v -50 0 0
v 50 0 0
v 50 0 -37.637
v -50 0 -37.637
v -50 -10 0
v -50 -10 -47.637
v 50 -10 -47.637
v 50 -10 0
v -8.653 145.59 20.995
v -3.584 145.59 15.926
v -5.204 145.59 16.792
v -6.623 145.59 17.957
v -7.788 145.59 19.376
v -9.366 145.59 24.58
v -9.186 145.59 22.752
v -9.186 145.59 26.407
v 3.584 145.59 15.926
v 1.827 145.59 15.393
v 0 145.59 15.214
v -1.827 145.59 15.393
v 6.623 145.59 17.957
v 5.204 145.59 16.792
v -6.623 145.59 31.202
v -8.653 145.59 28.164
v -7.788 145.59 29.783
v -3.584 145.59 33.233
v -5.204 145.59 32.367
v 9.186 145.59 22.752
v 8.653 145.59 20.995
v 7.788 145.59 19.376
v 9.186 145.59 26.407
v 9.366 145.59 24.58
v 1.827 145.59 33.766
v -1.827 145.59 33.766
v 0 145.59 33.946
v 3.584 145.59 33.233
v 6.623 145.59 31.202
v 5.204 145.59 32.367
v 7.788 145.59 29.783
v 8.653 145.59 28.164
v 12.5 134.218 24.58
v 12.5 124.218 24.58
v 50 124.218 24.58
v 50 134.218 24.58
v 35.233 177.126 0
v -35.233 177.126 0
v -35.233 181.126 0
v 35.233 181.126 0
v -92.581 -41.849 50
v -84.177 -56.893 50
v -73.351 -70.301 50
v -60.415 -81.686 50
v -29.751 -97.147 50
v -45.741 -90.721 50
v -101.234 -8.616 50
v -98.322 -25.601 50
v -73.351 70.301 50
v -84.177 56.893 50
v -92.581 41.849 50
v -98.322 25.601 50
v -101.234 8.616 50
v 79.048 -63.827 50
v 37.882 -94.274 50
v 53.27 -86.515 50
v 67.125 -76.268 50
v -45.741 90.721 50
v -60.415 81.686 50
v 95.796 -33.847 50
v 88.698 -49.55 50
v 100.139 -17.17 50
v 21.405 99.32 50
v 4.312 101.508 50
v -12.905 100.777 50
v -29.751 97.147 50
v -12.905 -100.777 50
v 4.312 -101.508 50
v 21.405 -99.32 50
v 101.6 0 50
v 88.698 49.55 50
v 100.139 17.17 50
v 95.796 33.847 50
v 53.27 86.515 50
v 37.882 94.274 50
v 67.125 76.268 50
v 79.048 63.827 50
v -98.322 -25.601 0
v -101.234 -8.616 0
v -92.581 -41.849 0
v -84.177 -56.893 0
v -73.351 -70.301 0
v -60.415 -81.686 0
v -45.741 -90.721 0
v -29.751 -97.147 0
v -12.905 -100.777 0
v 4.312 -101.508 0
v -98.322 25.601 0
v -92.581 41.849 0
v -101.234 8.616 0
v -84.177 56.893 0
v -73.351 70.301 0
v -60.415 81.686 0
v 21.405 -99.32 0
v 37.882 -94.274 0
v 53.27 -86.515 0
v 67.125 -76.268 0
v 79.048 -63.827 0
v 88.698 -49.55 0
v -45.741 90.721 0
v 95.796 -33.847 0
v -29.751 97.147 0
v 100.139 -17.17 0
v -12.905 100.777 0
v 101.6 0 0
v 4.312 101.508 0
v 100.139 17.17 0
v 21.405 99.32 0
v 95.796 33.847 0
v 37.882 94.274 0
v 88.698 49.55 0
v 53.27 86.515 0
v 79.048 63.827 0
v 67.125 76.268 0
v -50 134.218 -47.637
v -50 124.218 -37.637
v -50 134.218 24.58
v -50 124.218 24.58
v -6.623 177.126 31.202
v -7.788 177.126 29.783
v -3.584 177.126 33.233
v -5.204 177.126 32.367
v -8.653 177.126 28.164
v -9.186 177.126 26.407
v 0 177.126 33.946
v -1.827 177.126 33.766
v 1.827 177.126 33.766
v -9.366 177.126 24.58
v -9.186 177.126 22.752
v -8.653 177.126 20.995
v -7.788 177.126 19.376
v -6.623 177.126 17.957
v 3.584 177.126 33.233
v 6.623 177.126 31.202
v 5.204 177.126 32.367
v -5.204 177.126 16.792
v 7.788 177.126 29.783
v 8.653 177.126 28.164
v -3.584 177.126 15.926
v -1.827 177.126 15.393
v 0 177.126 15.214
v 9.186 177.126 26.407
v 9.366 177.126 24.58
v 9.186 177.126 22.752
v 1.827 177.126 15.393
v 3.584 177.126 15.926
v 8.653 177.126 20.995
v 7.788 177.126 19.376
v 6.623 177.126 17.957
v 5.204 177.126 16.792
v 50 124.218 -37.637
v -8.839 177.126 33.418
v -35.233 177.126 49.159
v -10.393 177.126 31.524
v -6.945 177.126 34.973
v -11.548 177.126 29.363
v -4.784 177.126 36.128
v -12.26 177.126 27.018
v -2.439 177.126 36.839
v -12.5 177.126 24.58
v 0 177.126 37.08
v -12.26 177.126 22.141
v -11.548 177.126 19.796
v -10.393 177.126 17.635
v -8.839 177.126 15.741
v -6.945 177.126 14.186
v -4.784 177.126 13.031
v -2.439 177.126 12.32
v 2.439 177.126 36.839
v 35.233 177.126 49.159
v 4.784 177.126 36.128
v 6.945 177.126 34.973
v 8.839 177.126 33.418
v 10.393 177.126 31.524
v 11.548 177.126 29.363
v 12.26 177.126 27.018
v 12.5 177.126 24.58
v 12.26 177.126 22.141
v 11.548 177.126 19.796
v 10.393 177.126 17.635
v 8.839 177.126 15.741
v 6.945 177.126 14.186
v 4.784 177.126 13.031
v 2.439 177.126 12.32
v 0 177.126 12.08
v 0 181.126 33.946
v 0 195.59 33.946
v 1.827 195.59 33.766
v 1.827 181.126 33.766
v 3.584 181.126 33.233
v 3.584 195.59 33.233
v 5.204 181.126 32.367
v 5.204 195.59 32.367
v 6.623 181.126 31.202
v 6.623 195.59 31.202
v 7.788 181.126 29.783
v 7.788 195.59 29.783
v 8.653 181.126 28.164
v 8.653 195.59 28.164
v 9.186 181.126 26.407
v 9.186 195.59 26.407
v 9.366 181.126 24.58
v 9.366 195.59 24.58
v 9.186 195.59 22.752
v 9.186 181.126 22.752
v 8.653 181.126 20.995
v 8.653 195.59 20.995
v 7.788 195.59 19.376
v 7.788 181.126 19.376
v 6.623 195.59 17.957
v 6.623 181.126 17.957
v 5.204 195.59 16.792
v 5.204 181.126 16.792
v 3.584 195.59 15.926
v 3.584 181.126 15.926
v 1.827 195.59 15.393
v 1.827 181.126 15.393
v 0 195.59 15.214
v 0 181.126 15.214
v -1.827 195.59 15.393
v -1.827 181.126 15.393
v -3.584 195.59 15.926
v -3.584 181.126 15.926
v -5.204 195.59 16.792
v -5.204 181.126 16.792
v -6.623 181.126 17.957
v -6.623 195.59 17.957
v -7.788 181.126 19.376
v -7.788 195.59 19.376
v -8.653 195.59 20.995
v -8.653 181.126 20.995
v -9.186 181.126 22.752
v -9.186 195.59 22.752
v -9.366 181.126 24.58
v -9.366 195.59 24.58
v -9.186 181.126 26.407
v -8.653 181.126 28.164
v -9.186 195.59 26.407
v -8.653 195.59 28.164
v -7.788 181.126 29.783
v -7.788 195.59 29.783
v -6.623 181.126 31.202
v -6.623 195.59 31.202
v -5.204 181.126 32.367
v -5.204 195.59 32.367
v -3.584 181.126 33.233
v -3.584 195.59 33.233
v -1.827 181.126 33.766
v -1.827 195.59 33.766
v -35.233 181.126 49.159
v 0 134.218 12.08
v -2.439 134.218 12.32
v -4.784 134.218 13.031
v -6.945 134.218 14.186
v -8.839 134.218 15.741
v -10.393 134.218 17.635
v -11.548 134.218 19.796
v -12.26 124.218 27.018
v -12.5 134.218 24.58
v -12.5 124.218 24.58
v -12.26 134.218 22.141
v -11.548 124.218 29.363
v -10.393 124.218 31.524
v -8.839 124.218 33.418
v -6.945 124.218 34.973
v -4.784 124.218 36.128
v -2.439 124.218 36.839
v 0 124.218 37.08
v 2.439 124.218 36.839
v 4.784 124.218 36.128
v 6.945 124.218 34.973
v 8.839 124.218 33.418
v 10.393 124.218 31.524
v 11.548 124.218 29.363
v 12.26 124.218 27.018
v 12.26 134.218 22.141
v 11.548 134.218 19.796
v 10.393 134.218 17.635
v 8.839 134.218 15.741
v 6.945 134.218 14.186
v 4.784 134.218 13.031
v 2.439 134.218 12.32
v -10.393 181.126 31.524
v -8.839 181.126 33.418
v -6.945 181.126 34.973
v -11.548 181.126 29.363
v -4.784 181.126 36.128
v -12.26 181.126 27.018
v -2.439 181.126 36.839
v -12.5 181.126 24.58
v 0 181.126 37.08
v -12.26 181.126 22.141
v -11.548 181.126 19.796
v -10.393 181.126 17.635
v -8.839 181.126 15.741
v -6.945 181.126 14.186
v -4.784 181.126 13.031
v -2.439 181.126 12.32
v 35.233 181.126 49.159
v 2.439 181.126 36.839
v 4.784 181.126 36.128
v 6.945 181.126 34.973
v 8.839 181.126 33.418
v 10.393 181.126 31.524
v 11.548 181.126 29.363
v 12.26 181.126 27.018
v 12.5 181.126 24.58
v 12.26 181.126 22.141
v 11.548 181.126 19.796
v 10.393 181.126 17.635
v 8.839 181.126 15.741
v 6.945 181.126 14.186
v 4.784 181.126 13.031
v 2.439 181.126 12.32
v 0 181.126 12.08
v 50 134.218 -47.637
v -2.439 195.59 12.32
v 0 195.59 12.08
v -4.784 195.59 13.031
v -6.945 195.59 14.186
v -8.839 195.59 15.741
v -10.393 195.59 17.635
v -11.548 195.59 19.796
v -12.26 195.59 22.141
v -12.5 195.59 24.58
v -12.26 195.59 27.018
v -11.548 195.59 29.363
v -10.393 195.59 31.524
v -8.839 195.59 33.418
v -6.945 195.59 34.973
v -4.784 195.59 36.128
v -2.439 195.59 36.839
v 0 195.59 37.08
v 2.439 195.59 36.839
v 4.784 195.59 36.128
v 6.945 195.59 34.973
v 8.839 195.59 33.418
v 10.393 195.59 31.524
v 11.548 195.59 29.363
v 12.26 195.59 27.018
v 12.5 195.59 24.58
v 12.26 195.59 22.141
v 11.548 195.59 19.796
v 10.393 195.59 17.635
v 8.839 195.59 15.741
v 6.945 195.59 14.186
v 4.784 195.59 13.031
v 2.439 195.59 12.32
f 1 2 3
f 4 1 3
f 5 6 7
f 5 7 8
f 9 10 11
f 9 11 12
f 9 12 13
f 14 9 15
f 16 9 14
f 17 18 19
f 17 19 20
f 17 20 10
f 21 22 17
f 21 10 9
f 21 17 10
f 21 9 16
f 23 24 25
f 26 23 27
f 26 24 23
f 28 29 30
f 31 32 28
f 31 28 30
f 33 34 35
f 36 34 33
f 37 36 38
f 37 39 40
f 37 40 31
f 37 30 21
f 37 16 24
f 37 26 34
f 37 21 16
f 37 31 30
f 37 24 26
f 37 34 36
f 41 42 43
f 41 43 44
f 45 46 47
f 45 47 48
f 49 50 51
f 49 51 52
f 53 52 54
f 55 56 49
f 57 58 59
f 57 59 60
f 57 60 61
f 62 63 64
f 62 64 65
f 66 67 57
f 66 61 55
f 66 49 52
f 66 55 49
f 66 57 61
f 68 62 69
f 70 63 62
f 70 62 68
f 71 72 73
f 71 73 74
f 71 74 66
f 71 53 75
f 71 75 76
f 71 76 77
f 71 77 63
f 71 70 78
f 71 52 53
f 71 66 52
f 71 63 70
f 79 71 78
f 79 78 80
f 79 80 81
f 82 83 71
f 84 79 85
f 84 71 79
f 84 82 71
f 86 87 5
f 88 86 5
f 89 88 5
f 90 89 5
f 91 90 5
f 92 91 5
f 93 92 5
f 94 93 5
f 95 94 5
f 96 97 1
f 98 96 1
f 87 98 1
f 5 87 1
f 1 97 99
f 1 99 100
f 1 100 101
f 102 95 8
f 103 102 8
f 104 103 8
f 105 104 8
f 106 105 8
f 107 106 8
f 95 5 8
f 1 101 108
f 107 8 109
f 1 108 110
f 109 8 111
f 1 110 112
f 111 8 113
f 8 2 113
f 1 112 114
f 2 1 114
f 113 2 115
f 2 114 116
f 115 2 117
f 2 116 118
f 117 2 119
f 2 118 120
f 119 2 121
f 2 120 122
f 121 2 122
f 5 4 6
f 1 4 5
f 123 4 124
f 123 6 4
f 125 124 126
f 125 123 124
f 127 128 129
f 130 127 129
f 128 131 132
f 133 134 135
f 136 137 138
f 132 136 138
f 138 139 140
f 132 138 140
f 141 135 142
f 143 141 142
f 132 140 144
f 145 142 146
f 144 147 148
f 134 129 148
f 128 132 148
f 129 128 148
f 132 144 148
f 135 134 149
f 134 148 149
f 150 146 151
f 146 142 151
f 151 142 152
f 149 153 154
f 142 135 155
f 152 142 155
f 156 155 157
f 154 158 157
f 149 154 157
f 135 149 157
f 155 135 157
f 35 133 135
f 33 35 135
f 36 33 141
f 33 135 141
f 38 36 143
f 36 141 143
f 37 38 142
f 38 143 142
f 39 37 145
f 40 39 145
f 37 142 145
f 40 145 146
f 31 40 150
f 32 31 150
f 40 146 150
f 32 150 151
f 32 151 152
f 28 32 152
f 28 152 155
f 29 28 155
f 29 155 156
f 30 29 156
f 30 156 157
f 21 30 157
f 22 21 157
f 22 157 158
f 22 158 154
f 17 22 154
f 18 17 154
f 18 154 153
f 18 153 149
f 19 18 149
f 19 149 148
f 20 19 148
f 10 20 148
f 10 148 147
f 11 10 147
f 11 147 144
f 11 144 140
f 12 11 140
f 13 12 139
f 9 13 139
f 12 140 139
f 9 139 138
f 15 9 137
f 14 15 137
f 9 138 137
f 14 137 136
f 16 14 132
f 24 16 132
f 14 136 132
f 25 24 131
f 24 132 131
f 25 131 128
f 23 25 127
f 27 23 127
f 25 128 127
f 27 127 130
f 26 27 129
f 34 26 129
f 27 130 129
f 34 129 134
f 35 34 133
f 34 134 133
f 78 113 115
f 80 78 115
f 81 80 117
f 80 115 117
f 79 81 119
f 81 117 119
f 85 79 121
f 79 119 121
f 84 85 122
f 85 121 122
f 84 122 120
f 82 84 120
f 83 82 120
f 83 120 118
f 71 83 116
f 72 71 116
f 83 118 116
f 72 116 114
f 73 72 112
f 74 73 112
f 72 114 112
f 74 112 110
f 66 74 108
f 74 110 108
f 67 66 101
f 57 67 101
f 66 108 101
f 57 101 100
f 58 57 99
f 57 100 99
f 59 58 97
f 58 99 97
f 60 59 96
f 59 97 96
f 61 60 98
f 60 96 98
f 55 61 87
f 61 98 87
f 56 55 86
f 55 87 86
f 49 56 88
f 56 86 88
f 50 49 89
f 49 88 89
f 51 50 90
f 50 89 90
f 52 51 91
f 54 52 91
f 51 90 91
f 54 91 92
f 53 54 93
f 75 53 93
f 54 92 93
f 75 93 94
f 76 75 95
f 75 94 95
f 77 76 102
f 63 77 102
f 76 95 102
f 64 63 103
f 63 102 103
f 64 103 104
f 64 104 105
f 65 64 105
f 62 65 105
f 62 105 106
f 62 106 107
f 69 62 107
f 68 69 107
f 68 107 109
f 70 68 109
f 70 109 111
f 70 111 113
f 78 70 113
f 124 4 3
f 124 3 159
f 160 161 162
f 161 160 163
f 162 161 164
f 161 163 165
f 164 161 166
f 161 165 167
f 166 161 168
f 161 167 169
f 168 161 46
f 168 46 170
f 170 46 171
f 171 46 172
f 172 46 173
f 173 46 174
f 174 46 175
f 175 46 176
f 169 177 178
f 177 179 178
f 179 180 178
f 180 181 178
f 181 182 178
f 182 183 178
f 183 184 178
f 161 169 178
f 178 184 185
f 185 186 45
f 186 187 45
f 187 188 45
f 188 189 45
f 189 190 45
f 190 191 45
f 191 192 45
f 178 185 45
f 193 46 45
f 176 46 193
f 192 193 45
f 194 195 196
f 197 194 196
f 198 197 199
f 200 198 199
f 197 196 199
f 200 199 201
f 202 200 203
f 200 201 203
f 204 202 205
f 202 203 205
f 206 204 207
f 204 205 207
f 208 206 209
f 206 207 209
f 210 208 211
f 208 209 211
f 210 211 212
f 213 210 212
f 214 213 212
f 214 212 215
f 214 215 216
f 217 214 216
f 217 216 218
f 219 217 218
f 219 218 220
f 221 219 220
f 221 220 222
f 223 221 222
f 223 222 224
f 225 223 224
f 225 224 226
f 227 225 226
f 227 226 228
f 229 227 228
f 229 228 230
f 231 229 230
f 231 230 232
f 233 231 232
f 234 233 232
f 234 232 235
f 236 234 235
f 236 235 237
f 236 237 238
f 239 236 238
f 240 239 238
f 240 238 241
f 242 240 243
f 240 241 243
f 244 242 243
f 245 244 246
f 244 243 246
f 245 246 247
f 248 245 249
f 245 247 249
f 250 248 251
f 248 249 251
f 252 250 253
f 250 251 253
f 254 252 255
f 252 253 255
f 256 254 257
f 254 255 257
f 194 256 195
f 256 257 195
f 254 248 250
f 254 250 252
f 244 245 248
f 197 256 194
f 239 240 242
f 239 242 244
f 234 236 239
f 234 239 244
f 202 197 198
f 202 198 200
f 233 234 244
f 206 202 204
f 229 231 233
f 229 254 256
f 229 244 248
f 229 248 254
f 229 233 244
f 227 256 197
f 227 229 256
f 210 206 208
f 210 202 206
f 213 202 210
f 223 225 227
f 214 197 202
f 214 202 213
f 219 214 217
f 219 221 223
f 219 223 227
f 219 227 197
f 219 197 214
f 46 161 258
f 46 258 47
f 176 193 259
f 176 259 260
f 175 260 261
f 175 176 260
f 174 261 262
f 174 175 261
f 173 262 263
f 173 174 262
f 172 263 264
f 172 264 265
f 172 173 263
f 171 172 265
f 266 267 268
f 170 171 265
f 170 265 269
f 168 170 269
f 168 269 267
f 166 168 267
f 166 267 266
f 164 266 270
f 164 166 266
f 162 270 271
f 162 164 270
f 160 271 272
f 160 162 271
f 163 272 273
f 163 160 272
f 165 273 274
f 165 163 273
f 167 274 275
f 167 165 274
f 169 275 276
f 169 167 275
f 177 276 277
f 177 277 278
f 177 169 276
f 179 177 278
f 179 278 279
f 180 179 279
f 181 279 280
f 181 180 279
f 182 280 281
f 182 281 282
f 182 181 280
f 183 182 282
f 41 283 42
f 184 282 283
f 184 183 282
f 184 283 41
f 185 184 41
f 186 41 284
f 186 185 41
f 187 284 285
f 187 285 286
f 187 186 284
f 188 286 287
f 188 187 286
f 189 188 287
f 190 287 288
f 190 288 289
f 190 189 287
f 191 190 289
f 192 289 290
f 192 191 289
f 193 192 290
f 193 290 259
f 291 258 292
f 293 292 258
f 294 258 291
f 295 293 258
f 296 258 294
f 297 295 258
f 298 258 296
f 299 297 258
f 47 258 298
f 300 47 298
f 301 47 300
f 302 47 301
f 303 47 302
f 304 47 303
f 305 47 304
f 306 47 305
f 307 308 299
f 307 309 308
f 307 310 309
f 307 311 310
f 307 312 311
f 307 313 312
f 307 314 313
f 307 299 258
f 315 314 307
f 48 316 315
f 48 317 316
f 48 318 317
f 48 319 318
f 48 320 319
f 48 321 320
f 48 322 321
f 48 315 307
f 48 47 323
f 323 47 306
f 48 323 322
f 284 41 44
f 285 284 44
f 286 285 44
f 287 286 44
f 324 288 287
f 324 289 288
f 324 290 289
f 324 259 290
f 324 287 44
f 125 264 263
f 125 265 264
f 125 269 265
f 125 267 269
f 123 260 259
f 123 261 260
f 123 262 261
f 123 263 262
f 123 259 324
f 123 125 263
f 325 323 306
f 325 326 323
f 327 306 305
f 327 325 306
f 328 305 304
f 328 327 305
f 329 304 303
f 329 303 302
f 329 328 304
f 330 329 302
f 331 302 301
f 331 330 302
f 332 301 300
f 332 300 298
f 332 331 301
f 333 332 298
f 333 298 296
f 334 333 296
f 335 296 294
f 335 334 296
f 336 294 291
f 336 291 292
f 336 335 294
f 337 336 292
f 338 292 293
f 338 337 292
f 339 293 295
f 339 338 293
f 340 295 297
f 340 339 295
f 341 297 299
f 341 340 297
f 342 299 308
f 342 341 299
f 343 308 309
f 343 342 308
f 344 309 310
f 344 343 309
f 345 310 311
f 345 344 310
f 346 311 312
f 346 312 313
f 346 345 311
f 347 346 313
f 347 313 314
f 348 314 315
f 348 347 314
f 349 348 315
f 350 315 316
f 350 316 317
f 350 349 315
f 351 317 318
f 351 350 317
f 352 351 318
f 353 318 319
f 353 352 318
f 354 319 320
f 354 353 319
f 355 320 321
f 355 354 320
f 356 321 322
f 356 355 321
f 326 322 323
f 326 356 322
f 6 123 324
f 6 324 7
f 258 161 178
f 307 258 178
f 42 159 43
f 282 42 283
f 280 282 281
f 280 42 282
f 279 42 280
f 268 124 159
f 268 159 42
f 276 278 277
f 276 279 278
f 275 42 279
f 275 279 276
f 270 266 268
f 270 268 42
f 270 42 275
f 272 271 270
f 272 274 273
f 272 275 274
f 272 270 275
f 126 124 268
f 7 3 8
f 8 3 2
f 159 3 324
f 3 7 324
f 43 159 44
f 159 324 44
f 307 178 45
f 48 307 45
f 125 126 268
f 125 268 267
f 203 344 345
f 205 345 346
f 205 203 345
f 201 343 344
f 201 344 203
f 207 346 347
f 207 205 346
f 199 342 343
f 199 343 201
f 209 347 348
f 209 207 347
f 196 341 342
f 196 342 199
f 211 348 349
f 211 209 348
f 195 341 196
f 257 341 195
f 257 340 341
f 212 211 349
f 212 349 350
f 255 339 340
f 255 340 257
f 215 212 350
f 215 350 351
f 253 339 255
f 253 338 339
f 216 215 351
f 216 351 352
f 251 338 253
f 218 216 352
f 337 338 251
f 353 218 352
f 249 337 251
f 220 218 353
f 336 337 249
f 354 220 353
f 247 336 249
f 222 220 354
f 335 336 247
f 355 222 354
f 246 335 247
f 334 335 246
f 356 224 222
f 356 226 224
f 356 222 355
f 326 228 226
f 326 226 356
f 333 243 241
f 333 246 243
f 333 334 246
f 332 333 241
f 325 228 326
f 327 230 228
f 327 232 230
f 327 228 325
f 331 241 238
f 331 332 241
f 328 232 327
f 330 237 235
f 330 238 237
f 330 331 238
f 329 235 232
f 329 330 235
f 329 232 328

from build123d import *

# Parameters (mm, degrees)
SKETCH1_R                = 101.6
BOSS_EXTRUDE1_DEPTH      = 50
SKETCH4_W                = 12.5
SKETCH4_H                = 71.371504998
EXTRUDE_THIN1_DEPTH      = 50
EXTRUDE_THIN1_DEPTH_BACK = 50
SKETCH5_R                = 9.366113587
CUT_EXTRUDE1_DEPTH       = 50
SKETCH6_W                = 70.465682624
SKETCH6_H                = 49.159233517
BOSS_EXTRUDE2_DEPTH      = 4


with BuildPart() as part:
    # Sketch1 → Boss-Extrude1 (new body)
    with BuildSketch(Plane.XY):
        Circle(SKETCH1_R)
    extrude(amount=BOSS_EXTRUDE1_DEPTH)



with BuildPart() as body_2:
    # Sketch4 → Revolve-Thin1 (revolve)
    with BuildSketch(Plane(origin=(0, 0, 0), x_dir=(0, 0, -1), z_dir=(1, 0, 0)), mode=Mode.PRIVATE) as revolve_thin1_sk:
        with Locations((-30.829616759, 159.903955702)):
            Rectangle(SKETCH4_W, SKETCH4_H)
    revolve(revolve_thin1_sk.sketch.rotate(Axis((0, 124.218203203, 24.579616759), (0, 1, 0)), 180), axis=Axis((0, 124.218203203, 24.579616759), (0, 1, 0)))


with BuildPart() as part_1:
    add(part.part)

    add(body_2.part)  # Extrude-Thin1 merges body 2
    # Sketch3 → Extrude-Thin1 (add, two sides: drawn at the far end of the back side and taken through both)
    with BuildSketch(Plane(origin=(0, 0, 0), x_dir=(0, 0, -1), z_dir=(1, 0, 0)).offset(-EXTRUDE_THIN1_DEPTH_BACK)):
        Polygon((-24.579616759, 0), (37.637102953, 0), (37.637102953, 124.218203203), (-24.579616759, 124.218203203), (-24.579616759, 134.218203203), (47.637102953, 134.218203203), (47.637102953, -10), (-24.579616759, -10), align=None)
    extrude(amount=EXTRUDE_THIN1_DEPTH + EXTRUDE_THIN1_DEPTH_BACK)

    # Sketch5 → Cut-Extrude1 (cut)
    with BuildSketch(Plane(origin=(0, 195.589708201, 0), x_dir=(1, 0, 0), z_dir=(0, 1, 0))):
        with Locations(Location((0, -24.579616759, 0), (0, 0, 270))):
            Circle(SKETCH5_R)
    extrude(amount=-CUT_EXTRUDE1_DEPTH, mode=Mode.SUBTRACT)

    # Sketch6 → Boss-Extrude2 (add)
    with BuildSketch(Plane(origin=(0, 177.126182074, 0), x_dir=(1, 0, 0), z_dir=(0, 1, 0))):
        with Locations((0, -24.579616759)):
            Rectangle(SKETCH6_W, SKETCH6_H)
    extrude(amount=BOSS_EXTRUDE2_DEPTH)


solid = part_1.part
